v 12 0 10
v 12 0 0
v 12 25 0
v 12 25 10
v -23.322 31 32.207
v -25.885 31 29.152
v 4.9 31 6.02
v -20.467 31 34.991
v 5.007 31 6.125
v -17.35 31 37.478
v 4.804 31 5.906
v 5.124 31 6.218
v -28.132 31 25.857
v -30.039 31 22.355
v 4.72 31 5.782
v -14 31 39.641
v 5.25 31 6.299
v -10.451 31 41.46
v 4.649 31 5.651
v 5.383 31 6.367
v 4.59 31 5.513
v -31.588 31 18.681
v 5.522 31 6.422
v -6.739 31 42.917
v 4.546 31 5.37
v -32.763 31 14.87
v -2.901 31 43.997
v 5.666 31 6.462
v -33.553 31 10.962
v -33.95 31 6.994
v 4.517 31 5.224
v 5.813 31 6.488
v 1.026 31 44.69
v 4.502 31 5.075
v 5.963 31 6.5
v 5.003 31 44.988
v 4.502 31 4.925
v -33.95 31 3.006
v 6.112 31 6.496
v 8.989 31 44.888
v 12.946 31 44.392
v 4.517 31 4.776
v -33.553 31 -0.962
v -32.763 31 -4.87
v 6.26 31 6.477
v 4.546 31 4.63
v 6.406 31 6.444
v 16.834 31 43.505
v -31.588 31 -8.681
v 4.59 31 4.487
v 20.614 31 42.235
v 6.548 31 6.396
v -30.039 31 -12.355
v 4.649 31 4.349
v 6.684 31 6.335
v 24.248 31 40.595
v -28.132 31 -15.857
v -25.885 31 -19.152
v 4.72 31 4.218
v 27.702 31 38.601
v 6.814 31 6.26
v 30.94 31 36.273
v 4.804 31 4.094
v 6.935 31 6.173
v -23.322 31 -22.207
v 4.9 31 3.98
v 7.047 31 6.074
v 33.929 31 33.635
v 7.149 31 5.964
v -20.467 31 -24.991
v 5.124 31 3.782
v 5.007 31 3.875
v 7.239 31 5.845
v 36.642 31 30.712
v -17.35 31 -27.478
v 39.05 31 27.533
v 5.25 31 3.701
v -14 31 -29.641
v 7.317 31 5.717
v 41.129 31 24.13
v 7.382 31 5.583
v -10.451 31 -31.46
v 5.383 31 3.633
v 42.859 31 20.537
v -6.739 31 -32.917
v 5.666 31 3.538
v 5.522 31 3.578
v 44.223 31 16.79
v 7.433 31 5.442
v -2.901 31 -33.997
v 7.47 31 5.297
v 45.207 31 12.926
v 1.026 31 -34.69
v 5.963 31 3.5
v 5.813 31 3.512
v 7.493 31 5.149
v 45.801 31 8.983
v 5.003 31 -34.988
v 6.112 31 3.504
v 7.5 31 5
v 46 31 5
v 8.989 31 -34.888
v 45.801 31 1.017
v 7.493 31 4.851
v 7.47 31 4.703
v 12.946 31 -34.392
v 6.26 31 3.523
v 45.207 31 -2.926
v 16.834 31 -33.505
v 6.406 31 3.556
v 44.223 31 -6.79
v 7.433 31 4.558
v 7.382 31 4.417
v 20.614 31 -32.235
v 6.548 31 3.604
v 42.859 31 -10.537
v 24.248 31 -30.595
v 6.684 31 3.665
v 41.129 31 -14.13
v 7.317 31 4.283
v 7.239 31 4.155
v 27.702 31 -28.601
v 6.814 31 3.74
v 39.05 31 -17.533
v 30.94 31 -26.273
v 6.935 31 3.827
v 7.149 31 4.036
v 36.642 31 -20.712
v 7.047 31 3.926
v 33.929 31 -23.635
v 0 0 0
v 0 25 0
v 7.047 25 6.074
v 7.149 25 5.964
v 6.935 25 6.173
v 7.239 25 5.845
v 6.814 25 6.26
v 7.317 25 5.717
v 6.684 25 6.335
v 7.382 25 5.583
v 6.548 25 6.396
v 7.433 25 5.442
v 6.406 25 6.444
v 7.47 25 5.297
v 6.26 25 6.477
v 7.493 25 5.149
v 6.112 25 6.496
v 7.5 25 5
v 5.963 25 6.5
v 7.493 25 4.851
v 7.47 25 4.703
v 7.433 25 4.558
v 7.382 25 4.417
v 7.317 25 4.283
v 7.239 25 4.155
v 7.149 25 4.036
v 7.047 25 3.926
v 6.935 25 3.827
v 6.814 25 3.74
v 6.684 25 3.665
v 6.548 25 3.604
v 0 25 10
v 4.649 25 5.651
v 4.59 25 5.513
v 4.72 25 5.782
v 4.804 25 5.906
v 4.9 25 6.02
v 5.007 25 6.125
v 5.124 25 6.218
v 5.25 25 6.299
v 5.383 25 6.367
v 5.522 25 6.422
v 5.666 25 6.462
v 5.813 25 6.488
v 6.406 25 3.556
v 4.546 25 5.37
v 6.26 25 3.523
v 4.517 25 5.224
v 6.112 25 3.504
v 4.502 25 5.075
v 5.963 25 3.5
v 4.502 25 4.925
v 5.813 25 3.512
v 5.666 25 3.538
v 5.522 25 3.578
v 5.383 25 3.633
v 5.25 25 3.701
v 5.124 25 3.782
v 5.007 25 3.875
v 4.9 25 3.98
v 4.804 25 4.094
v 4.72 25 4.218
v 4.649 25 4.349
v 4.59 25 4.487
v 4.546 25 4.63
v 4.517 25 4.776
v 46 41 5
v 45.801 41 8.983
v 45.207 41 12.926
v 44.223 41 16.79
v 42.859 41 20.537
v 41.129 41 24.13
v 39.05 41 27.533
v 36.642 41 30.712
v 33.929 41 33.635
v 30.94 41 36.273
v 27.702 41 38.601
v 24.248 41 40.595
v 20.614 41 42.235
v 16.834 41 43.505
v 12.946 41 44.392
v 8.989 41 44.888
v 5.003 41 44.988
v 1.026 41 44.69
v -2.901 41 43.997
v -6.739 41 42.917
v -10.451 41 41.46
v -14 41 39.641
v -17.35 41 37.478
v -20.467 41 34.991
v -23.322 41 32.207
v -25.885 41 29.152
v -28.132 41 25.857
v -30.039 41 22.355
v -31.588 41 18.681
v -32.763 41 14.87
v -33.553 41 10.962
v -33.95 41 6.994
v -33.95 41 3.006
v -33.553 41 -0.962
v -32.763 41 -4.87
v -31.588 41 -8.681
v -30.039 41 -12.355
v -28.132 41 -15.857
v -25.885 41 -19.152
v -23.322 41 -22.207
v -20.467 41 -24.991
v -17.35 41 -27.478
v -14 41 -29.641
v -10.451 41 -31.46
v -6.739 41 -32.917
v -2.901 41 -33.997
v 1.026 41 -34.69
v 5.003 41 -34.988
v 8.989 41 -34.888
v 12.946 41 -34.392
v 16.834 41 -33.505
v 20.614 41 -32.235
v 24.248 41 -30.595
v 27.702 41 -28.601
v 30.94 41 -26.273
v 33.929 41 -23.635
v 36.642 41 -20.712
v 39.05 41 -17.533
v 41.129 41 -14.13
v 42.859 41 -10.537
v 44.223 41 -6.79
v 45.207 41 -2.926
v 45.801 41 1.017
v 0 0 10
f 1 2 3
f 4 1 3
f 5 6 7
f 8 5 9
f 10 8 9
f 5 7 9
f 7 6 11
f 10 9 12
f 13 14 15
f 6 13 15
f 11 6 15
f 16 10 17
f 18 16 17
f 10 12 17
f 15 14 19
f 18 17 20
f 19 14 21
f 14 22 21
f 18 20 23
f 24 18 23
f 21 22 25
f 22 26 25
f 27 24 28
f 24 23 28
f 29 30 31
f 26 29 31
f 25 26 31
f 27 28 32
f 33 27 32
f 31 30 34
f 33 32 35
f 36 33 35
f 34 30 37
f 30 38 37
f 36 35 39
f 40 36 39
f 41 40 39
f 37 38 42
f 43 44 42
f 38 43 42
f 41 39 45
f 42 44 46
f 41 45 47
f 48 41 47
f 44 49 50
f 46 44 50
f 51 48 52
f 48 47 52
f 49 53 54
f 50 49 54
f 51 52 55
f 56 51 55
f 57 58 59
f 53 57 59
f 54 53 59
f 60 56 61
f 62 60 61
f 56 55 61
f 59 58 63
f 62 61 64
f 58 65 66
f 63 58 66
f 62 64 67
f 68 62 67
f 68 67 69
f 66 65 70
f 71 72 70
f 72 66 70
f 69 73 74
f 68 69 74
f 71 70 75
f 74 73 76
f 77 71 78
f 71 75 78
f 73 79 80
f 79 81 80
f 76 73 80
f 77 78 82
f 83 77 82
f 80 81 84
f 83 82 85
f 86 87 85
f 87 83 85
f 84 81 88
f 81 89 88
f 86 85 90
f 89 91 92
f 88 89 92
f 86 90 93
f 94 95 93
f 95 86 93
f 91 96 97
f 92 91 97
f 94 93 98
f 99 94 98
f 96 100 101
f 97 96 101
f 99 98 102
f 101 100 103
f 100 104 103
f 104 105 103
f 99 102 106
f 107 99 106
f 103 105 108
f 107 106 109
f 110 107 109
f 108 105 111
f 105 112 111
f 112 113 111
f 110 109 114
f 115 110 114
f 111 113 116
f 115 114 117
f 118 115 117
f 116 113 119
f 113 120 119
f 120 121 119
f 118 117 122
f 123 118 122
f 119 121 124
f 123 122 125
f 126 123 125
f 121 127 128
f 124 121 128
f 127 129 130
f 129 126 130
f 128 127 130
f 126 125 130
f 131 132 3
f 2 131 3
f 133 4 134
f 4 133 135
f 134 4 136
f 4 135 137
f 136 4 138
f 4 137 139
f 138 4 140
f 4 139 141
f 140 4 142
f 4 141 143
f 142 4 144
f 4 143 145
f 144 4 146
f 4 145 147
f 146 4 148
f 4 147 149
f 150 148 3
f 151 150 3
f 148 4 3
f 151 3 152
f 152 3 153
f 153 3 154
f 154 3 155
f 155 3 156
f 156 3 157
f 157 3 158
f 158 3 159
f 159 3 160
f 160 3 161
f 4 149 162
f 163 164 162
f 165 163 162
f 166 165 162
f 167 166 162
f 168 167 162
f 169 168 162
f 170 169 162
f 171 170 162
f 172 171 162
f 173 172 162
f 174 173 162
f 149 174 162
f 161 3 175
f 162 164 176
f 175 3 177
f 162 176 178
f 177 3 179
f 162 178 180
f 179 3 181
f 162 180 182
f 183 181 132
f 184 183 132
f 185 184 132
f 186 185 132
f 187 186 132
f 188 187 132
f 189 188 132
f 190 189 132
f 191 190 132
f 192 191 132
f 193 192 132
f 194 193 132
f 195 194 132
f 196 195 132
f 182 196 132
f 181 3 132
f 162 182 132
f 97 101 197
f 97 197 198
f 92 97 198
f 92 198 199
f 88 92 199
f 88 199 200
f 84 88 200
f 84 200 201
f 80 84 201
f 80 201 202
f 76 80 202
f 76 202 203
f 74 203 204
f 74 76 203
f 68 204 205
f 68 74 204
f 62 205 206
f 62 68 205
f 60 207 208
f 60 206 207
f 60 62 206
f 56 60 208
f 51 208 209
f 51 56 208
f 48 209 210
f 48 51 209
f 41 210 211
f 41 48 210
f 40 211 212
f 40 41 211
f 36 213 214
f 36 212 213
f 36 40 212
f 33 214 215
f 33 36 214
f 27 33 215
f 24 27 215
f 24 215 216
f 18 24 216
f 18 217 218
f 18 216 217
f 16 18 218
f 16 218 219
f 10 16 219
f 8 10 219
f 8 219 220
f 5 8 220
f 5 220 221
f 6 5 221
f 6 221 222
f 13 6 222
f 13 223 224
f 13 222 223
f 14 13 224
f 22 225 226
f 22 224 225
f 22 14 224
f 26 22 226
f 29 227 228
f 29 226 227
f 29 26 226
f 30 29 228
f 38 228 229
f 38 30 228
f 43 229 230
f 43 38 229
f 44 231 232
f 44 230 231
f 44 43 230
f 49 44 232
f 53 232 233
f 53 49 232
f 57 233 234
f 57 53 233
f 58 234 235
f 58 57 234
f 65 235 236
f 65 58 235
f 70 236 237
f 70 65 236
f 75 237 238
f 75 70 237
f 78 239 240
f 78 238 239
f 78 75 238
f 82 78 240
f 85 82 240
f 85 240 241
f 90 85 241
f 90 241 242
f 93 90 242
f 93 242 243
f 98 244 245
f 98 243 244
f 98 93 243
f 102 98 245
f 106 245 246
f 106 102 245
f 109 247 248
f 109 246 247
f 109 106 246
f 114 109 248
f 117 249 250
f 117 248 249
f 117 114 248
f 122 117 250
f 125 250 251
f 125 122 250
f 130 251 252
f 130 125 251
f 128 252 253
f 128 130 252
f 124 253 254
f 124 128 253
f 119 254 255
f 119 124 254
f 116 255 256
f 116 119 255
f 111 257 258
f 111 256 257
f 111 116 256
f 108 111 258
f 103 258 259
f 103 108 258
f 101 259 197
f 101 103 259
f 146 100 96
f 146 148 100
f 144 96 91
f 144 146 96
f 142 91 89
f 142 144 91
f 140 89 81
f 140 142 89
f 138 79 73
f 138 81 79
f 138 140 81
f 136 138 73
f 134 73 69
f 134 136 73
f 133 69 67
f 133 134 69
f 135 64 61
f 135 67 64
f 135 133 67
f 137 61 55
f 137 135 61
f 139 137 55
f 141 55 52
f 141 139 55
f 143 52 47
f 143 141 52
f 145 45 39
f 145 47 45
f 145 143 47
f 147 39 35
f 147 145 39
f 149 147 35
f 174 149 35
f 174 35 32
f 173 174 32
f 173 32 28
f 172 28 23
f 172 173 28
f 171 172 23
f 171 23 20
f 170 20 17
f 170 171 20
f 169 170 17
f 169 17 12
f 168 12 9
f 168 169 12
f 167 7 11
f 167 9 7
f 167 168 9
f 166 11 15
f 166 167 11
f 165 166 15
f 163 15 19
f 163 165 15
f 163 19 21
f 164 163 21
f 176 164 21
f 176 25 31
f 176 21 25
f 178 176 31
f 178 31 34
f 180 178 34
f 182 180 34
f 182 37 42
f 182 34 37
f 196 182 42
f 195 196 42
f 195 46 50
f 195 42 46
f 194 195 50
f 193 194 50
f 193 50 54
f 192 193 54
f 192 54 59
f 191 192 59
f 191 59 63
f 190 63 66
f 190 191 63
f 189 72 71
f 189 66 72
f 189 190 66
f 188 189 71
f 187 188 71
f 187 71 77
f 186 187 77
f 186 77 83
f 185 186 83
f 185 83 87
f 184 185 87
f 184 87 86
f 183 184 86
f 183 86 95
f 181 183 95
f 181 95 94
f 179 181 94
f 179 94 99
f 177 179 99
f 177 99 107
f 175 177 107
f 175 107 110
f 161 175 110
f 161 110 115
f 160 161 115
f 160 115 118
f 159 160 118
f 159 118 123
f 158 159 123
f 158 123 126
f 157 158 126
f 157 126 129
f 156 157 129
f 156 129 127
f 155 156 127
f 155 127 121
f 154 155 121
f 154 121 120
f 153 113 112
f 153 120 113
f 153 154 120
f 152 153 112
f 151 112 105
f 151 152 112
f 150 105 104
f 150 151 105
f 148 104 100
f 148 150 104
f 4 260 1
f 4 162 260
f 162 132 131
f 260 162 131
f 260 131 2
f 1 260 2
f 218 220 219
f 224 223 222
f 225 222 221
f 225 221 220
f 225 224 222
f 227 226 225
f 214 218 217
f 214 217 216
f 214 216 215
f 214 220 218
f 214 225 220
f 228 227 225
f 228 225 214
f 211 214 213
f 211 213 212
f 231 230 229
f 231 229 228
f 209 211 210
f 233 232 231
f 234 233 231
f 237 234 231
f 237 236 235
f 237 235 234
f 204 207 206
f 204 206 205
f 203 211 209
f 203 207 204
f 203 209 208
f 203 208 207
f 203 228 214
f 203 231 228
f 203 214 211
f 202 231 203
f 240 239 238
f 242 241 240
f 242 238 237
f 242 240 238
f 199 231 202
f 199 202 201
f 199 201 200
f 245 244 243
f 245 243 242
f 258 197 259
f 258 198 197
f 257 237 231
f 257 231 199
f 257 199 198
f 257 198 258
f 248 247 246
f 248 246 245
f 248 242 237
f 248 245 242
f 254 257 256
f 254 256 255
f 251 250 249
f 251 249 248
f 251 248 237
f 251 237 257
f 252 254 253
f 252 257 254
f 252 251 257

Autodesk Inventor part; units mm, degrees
ref_plane "YZ Plane" through (0, 0, 0) normal (1, 0, 0) x (0, 1, 0)
ref_plane "XZ Plane" through (0, 0, 0) normal (0, 1, 0) x (-1, 0, 0)
ref_plane "XY Plane" through (0, 0, 0) normal (0, 0, 1) x (1, 0, 0)
sketch "Sketch1" plane through (0, 0, 0) normal (0, 0, 1) x (1, 0, 0)
  line L0 (0, 0) -> (12, 0)
  line L1 (12, 0) -> (12, 25)
  line L2 (12, 25) -> (0, 25)
  line L3 (0, 25) -> (0, 0)
  dimension "d0" = 12
  dimension "d1" = 25
extrude "Extrusion1" add sketch "Sketch1" along normal blind 10
sketch "Sketch2" plane through (0, 25, 0) normal (0, 1, 0) x (1, 0, 0)
  line L0 (12, 0) -> (0, 0) construction
  line L1 (0, 0) -> (0, -10) construction
  line L2 (12, -10) -> (0, -10) construction
  line L3 (12, 0) -> (12, -10) construction
  circle A0 centre (6, -5) radius 1.5
  point P0 (12, -5)
  point P1 (6, -10)
  dimension "d4" = 3
extrude "Extrusion2" add sketch "Sketch2" along normal blind 6
sketch "Sketch3" plane through (6, 31, 5) normal (0, 1, 0) x (1, 0, 0)
  circle A0 centre (0, 0) radius 1.5 construction
  circle A1 centre (0, 0) radius 40
  point P0 (-6, 5)
  dimension "d7" = 80
extrude "Extrusion3" add sketch "Sketch3" along normal blind 10
properties part number "Wheel and Motor"
